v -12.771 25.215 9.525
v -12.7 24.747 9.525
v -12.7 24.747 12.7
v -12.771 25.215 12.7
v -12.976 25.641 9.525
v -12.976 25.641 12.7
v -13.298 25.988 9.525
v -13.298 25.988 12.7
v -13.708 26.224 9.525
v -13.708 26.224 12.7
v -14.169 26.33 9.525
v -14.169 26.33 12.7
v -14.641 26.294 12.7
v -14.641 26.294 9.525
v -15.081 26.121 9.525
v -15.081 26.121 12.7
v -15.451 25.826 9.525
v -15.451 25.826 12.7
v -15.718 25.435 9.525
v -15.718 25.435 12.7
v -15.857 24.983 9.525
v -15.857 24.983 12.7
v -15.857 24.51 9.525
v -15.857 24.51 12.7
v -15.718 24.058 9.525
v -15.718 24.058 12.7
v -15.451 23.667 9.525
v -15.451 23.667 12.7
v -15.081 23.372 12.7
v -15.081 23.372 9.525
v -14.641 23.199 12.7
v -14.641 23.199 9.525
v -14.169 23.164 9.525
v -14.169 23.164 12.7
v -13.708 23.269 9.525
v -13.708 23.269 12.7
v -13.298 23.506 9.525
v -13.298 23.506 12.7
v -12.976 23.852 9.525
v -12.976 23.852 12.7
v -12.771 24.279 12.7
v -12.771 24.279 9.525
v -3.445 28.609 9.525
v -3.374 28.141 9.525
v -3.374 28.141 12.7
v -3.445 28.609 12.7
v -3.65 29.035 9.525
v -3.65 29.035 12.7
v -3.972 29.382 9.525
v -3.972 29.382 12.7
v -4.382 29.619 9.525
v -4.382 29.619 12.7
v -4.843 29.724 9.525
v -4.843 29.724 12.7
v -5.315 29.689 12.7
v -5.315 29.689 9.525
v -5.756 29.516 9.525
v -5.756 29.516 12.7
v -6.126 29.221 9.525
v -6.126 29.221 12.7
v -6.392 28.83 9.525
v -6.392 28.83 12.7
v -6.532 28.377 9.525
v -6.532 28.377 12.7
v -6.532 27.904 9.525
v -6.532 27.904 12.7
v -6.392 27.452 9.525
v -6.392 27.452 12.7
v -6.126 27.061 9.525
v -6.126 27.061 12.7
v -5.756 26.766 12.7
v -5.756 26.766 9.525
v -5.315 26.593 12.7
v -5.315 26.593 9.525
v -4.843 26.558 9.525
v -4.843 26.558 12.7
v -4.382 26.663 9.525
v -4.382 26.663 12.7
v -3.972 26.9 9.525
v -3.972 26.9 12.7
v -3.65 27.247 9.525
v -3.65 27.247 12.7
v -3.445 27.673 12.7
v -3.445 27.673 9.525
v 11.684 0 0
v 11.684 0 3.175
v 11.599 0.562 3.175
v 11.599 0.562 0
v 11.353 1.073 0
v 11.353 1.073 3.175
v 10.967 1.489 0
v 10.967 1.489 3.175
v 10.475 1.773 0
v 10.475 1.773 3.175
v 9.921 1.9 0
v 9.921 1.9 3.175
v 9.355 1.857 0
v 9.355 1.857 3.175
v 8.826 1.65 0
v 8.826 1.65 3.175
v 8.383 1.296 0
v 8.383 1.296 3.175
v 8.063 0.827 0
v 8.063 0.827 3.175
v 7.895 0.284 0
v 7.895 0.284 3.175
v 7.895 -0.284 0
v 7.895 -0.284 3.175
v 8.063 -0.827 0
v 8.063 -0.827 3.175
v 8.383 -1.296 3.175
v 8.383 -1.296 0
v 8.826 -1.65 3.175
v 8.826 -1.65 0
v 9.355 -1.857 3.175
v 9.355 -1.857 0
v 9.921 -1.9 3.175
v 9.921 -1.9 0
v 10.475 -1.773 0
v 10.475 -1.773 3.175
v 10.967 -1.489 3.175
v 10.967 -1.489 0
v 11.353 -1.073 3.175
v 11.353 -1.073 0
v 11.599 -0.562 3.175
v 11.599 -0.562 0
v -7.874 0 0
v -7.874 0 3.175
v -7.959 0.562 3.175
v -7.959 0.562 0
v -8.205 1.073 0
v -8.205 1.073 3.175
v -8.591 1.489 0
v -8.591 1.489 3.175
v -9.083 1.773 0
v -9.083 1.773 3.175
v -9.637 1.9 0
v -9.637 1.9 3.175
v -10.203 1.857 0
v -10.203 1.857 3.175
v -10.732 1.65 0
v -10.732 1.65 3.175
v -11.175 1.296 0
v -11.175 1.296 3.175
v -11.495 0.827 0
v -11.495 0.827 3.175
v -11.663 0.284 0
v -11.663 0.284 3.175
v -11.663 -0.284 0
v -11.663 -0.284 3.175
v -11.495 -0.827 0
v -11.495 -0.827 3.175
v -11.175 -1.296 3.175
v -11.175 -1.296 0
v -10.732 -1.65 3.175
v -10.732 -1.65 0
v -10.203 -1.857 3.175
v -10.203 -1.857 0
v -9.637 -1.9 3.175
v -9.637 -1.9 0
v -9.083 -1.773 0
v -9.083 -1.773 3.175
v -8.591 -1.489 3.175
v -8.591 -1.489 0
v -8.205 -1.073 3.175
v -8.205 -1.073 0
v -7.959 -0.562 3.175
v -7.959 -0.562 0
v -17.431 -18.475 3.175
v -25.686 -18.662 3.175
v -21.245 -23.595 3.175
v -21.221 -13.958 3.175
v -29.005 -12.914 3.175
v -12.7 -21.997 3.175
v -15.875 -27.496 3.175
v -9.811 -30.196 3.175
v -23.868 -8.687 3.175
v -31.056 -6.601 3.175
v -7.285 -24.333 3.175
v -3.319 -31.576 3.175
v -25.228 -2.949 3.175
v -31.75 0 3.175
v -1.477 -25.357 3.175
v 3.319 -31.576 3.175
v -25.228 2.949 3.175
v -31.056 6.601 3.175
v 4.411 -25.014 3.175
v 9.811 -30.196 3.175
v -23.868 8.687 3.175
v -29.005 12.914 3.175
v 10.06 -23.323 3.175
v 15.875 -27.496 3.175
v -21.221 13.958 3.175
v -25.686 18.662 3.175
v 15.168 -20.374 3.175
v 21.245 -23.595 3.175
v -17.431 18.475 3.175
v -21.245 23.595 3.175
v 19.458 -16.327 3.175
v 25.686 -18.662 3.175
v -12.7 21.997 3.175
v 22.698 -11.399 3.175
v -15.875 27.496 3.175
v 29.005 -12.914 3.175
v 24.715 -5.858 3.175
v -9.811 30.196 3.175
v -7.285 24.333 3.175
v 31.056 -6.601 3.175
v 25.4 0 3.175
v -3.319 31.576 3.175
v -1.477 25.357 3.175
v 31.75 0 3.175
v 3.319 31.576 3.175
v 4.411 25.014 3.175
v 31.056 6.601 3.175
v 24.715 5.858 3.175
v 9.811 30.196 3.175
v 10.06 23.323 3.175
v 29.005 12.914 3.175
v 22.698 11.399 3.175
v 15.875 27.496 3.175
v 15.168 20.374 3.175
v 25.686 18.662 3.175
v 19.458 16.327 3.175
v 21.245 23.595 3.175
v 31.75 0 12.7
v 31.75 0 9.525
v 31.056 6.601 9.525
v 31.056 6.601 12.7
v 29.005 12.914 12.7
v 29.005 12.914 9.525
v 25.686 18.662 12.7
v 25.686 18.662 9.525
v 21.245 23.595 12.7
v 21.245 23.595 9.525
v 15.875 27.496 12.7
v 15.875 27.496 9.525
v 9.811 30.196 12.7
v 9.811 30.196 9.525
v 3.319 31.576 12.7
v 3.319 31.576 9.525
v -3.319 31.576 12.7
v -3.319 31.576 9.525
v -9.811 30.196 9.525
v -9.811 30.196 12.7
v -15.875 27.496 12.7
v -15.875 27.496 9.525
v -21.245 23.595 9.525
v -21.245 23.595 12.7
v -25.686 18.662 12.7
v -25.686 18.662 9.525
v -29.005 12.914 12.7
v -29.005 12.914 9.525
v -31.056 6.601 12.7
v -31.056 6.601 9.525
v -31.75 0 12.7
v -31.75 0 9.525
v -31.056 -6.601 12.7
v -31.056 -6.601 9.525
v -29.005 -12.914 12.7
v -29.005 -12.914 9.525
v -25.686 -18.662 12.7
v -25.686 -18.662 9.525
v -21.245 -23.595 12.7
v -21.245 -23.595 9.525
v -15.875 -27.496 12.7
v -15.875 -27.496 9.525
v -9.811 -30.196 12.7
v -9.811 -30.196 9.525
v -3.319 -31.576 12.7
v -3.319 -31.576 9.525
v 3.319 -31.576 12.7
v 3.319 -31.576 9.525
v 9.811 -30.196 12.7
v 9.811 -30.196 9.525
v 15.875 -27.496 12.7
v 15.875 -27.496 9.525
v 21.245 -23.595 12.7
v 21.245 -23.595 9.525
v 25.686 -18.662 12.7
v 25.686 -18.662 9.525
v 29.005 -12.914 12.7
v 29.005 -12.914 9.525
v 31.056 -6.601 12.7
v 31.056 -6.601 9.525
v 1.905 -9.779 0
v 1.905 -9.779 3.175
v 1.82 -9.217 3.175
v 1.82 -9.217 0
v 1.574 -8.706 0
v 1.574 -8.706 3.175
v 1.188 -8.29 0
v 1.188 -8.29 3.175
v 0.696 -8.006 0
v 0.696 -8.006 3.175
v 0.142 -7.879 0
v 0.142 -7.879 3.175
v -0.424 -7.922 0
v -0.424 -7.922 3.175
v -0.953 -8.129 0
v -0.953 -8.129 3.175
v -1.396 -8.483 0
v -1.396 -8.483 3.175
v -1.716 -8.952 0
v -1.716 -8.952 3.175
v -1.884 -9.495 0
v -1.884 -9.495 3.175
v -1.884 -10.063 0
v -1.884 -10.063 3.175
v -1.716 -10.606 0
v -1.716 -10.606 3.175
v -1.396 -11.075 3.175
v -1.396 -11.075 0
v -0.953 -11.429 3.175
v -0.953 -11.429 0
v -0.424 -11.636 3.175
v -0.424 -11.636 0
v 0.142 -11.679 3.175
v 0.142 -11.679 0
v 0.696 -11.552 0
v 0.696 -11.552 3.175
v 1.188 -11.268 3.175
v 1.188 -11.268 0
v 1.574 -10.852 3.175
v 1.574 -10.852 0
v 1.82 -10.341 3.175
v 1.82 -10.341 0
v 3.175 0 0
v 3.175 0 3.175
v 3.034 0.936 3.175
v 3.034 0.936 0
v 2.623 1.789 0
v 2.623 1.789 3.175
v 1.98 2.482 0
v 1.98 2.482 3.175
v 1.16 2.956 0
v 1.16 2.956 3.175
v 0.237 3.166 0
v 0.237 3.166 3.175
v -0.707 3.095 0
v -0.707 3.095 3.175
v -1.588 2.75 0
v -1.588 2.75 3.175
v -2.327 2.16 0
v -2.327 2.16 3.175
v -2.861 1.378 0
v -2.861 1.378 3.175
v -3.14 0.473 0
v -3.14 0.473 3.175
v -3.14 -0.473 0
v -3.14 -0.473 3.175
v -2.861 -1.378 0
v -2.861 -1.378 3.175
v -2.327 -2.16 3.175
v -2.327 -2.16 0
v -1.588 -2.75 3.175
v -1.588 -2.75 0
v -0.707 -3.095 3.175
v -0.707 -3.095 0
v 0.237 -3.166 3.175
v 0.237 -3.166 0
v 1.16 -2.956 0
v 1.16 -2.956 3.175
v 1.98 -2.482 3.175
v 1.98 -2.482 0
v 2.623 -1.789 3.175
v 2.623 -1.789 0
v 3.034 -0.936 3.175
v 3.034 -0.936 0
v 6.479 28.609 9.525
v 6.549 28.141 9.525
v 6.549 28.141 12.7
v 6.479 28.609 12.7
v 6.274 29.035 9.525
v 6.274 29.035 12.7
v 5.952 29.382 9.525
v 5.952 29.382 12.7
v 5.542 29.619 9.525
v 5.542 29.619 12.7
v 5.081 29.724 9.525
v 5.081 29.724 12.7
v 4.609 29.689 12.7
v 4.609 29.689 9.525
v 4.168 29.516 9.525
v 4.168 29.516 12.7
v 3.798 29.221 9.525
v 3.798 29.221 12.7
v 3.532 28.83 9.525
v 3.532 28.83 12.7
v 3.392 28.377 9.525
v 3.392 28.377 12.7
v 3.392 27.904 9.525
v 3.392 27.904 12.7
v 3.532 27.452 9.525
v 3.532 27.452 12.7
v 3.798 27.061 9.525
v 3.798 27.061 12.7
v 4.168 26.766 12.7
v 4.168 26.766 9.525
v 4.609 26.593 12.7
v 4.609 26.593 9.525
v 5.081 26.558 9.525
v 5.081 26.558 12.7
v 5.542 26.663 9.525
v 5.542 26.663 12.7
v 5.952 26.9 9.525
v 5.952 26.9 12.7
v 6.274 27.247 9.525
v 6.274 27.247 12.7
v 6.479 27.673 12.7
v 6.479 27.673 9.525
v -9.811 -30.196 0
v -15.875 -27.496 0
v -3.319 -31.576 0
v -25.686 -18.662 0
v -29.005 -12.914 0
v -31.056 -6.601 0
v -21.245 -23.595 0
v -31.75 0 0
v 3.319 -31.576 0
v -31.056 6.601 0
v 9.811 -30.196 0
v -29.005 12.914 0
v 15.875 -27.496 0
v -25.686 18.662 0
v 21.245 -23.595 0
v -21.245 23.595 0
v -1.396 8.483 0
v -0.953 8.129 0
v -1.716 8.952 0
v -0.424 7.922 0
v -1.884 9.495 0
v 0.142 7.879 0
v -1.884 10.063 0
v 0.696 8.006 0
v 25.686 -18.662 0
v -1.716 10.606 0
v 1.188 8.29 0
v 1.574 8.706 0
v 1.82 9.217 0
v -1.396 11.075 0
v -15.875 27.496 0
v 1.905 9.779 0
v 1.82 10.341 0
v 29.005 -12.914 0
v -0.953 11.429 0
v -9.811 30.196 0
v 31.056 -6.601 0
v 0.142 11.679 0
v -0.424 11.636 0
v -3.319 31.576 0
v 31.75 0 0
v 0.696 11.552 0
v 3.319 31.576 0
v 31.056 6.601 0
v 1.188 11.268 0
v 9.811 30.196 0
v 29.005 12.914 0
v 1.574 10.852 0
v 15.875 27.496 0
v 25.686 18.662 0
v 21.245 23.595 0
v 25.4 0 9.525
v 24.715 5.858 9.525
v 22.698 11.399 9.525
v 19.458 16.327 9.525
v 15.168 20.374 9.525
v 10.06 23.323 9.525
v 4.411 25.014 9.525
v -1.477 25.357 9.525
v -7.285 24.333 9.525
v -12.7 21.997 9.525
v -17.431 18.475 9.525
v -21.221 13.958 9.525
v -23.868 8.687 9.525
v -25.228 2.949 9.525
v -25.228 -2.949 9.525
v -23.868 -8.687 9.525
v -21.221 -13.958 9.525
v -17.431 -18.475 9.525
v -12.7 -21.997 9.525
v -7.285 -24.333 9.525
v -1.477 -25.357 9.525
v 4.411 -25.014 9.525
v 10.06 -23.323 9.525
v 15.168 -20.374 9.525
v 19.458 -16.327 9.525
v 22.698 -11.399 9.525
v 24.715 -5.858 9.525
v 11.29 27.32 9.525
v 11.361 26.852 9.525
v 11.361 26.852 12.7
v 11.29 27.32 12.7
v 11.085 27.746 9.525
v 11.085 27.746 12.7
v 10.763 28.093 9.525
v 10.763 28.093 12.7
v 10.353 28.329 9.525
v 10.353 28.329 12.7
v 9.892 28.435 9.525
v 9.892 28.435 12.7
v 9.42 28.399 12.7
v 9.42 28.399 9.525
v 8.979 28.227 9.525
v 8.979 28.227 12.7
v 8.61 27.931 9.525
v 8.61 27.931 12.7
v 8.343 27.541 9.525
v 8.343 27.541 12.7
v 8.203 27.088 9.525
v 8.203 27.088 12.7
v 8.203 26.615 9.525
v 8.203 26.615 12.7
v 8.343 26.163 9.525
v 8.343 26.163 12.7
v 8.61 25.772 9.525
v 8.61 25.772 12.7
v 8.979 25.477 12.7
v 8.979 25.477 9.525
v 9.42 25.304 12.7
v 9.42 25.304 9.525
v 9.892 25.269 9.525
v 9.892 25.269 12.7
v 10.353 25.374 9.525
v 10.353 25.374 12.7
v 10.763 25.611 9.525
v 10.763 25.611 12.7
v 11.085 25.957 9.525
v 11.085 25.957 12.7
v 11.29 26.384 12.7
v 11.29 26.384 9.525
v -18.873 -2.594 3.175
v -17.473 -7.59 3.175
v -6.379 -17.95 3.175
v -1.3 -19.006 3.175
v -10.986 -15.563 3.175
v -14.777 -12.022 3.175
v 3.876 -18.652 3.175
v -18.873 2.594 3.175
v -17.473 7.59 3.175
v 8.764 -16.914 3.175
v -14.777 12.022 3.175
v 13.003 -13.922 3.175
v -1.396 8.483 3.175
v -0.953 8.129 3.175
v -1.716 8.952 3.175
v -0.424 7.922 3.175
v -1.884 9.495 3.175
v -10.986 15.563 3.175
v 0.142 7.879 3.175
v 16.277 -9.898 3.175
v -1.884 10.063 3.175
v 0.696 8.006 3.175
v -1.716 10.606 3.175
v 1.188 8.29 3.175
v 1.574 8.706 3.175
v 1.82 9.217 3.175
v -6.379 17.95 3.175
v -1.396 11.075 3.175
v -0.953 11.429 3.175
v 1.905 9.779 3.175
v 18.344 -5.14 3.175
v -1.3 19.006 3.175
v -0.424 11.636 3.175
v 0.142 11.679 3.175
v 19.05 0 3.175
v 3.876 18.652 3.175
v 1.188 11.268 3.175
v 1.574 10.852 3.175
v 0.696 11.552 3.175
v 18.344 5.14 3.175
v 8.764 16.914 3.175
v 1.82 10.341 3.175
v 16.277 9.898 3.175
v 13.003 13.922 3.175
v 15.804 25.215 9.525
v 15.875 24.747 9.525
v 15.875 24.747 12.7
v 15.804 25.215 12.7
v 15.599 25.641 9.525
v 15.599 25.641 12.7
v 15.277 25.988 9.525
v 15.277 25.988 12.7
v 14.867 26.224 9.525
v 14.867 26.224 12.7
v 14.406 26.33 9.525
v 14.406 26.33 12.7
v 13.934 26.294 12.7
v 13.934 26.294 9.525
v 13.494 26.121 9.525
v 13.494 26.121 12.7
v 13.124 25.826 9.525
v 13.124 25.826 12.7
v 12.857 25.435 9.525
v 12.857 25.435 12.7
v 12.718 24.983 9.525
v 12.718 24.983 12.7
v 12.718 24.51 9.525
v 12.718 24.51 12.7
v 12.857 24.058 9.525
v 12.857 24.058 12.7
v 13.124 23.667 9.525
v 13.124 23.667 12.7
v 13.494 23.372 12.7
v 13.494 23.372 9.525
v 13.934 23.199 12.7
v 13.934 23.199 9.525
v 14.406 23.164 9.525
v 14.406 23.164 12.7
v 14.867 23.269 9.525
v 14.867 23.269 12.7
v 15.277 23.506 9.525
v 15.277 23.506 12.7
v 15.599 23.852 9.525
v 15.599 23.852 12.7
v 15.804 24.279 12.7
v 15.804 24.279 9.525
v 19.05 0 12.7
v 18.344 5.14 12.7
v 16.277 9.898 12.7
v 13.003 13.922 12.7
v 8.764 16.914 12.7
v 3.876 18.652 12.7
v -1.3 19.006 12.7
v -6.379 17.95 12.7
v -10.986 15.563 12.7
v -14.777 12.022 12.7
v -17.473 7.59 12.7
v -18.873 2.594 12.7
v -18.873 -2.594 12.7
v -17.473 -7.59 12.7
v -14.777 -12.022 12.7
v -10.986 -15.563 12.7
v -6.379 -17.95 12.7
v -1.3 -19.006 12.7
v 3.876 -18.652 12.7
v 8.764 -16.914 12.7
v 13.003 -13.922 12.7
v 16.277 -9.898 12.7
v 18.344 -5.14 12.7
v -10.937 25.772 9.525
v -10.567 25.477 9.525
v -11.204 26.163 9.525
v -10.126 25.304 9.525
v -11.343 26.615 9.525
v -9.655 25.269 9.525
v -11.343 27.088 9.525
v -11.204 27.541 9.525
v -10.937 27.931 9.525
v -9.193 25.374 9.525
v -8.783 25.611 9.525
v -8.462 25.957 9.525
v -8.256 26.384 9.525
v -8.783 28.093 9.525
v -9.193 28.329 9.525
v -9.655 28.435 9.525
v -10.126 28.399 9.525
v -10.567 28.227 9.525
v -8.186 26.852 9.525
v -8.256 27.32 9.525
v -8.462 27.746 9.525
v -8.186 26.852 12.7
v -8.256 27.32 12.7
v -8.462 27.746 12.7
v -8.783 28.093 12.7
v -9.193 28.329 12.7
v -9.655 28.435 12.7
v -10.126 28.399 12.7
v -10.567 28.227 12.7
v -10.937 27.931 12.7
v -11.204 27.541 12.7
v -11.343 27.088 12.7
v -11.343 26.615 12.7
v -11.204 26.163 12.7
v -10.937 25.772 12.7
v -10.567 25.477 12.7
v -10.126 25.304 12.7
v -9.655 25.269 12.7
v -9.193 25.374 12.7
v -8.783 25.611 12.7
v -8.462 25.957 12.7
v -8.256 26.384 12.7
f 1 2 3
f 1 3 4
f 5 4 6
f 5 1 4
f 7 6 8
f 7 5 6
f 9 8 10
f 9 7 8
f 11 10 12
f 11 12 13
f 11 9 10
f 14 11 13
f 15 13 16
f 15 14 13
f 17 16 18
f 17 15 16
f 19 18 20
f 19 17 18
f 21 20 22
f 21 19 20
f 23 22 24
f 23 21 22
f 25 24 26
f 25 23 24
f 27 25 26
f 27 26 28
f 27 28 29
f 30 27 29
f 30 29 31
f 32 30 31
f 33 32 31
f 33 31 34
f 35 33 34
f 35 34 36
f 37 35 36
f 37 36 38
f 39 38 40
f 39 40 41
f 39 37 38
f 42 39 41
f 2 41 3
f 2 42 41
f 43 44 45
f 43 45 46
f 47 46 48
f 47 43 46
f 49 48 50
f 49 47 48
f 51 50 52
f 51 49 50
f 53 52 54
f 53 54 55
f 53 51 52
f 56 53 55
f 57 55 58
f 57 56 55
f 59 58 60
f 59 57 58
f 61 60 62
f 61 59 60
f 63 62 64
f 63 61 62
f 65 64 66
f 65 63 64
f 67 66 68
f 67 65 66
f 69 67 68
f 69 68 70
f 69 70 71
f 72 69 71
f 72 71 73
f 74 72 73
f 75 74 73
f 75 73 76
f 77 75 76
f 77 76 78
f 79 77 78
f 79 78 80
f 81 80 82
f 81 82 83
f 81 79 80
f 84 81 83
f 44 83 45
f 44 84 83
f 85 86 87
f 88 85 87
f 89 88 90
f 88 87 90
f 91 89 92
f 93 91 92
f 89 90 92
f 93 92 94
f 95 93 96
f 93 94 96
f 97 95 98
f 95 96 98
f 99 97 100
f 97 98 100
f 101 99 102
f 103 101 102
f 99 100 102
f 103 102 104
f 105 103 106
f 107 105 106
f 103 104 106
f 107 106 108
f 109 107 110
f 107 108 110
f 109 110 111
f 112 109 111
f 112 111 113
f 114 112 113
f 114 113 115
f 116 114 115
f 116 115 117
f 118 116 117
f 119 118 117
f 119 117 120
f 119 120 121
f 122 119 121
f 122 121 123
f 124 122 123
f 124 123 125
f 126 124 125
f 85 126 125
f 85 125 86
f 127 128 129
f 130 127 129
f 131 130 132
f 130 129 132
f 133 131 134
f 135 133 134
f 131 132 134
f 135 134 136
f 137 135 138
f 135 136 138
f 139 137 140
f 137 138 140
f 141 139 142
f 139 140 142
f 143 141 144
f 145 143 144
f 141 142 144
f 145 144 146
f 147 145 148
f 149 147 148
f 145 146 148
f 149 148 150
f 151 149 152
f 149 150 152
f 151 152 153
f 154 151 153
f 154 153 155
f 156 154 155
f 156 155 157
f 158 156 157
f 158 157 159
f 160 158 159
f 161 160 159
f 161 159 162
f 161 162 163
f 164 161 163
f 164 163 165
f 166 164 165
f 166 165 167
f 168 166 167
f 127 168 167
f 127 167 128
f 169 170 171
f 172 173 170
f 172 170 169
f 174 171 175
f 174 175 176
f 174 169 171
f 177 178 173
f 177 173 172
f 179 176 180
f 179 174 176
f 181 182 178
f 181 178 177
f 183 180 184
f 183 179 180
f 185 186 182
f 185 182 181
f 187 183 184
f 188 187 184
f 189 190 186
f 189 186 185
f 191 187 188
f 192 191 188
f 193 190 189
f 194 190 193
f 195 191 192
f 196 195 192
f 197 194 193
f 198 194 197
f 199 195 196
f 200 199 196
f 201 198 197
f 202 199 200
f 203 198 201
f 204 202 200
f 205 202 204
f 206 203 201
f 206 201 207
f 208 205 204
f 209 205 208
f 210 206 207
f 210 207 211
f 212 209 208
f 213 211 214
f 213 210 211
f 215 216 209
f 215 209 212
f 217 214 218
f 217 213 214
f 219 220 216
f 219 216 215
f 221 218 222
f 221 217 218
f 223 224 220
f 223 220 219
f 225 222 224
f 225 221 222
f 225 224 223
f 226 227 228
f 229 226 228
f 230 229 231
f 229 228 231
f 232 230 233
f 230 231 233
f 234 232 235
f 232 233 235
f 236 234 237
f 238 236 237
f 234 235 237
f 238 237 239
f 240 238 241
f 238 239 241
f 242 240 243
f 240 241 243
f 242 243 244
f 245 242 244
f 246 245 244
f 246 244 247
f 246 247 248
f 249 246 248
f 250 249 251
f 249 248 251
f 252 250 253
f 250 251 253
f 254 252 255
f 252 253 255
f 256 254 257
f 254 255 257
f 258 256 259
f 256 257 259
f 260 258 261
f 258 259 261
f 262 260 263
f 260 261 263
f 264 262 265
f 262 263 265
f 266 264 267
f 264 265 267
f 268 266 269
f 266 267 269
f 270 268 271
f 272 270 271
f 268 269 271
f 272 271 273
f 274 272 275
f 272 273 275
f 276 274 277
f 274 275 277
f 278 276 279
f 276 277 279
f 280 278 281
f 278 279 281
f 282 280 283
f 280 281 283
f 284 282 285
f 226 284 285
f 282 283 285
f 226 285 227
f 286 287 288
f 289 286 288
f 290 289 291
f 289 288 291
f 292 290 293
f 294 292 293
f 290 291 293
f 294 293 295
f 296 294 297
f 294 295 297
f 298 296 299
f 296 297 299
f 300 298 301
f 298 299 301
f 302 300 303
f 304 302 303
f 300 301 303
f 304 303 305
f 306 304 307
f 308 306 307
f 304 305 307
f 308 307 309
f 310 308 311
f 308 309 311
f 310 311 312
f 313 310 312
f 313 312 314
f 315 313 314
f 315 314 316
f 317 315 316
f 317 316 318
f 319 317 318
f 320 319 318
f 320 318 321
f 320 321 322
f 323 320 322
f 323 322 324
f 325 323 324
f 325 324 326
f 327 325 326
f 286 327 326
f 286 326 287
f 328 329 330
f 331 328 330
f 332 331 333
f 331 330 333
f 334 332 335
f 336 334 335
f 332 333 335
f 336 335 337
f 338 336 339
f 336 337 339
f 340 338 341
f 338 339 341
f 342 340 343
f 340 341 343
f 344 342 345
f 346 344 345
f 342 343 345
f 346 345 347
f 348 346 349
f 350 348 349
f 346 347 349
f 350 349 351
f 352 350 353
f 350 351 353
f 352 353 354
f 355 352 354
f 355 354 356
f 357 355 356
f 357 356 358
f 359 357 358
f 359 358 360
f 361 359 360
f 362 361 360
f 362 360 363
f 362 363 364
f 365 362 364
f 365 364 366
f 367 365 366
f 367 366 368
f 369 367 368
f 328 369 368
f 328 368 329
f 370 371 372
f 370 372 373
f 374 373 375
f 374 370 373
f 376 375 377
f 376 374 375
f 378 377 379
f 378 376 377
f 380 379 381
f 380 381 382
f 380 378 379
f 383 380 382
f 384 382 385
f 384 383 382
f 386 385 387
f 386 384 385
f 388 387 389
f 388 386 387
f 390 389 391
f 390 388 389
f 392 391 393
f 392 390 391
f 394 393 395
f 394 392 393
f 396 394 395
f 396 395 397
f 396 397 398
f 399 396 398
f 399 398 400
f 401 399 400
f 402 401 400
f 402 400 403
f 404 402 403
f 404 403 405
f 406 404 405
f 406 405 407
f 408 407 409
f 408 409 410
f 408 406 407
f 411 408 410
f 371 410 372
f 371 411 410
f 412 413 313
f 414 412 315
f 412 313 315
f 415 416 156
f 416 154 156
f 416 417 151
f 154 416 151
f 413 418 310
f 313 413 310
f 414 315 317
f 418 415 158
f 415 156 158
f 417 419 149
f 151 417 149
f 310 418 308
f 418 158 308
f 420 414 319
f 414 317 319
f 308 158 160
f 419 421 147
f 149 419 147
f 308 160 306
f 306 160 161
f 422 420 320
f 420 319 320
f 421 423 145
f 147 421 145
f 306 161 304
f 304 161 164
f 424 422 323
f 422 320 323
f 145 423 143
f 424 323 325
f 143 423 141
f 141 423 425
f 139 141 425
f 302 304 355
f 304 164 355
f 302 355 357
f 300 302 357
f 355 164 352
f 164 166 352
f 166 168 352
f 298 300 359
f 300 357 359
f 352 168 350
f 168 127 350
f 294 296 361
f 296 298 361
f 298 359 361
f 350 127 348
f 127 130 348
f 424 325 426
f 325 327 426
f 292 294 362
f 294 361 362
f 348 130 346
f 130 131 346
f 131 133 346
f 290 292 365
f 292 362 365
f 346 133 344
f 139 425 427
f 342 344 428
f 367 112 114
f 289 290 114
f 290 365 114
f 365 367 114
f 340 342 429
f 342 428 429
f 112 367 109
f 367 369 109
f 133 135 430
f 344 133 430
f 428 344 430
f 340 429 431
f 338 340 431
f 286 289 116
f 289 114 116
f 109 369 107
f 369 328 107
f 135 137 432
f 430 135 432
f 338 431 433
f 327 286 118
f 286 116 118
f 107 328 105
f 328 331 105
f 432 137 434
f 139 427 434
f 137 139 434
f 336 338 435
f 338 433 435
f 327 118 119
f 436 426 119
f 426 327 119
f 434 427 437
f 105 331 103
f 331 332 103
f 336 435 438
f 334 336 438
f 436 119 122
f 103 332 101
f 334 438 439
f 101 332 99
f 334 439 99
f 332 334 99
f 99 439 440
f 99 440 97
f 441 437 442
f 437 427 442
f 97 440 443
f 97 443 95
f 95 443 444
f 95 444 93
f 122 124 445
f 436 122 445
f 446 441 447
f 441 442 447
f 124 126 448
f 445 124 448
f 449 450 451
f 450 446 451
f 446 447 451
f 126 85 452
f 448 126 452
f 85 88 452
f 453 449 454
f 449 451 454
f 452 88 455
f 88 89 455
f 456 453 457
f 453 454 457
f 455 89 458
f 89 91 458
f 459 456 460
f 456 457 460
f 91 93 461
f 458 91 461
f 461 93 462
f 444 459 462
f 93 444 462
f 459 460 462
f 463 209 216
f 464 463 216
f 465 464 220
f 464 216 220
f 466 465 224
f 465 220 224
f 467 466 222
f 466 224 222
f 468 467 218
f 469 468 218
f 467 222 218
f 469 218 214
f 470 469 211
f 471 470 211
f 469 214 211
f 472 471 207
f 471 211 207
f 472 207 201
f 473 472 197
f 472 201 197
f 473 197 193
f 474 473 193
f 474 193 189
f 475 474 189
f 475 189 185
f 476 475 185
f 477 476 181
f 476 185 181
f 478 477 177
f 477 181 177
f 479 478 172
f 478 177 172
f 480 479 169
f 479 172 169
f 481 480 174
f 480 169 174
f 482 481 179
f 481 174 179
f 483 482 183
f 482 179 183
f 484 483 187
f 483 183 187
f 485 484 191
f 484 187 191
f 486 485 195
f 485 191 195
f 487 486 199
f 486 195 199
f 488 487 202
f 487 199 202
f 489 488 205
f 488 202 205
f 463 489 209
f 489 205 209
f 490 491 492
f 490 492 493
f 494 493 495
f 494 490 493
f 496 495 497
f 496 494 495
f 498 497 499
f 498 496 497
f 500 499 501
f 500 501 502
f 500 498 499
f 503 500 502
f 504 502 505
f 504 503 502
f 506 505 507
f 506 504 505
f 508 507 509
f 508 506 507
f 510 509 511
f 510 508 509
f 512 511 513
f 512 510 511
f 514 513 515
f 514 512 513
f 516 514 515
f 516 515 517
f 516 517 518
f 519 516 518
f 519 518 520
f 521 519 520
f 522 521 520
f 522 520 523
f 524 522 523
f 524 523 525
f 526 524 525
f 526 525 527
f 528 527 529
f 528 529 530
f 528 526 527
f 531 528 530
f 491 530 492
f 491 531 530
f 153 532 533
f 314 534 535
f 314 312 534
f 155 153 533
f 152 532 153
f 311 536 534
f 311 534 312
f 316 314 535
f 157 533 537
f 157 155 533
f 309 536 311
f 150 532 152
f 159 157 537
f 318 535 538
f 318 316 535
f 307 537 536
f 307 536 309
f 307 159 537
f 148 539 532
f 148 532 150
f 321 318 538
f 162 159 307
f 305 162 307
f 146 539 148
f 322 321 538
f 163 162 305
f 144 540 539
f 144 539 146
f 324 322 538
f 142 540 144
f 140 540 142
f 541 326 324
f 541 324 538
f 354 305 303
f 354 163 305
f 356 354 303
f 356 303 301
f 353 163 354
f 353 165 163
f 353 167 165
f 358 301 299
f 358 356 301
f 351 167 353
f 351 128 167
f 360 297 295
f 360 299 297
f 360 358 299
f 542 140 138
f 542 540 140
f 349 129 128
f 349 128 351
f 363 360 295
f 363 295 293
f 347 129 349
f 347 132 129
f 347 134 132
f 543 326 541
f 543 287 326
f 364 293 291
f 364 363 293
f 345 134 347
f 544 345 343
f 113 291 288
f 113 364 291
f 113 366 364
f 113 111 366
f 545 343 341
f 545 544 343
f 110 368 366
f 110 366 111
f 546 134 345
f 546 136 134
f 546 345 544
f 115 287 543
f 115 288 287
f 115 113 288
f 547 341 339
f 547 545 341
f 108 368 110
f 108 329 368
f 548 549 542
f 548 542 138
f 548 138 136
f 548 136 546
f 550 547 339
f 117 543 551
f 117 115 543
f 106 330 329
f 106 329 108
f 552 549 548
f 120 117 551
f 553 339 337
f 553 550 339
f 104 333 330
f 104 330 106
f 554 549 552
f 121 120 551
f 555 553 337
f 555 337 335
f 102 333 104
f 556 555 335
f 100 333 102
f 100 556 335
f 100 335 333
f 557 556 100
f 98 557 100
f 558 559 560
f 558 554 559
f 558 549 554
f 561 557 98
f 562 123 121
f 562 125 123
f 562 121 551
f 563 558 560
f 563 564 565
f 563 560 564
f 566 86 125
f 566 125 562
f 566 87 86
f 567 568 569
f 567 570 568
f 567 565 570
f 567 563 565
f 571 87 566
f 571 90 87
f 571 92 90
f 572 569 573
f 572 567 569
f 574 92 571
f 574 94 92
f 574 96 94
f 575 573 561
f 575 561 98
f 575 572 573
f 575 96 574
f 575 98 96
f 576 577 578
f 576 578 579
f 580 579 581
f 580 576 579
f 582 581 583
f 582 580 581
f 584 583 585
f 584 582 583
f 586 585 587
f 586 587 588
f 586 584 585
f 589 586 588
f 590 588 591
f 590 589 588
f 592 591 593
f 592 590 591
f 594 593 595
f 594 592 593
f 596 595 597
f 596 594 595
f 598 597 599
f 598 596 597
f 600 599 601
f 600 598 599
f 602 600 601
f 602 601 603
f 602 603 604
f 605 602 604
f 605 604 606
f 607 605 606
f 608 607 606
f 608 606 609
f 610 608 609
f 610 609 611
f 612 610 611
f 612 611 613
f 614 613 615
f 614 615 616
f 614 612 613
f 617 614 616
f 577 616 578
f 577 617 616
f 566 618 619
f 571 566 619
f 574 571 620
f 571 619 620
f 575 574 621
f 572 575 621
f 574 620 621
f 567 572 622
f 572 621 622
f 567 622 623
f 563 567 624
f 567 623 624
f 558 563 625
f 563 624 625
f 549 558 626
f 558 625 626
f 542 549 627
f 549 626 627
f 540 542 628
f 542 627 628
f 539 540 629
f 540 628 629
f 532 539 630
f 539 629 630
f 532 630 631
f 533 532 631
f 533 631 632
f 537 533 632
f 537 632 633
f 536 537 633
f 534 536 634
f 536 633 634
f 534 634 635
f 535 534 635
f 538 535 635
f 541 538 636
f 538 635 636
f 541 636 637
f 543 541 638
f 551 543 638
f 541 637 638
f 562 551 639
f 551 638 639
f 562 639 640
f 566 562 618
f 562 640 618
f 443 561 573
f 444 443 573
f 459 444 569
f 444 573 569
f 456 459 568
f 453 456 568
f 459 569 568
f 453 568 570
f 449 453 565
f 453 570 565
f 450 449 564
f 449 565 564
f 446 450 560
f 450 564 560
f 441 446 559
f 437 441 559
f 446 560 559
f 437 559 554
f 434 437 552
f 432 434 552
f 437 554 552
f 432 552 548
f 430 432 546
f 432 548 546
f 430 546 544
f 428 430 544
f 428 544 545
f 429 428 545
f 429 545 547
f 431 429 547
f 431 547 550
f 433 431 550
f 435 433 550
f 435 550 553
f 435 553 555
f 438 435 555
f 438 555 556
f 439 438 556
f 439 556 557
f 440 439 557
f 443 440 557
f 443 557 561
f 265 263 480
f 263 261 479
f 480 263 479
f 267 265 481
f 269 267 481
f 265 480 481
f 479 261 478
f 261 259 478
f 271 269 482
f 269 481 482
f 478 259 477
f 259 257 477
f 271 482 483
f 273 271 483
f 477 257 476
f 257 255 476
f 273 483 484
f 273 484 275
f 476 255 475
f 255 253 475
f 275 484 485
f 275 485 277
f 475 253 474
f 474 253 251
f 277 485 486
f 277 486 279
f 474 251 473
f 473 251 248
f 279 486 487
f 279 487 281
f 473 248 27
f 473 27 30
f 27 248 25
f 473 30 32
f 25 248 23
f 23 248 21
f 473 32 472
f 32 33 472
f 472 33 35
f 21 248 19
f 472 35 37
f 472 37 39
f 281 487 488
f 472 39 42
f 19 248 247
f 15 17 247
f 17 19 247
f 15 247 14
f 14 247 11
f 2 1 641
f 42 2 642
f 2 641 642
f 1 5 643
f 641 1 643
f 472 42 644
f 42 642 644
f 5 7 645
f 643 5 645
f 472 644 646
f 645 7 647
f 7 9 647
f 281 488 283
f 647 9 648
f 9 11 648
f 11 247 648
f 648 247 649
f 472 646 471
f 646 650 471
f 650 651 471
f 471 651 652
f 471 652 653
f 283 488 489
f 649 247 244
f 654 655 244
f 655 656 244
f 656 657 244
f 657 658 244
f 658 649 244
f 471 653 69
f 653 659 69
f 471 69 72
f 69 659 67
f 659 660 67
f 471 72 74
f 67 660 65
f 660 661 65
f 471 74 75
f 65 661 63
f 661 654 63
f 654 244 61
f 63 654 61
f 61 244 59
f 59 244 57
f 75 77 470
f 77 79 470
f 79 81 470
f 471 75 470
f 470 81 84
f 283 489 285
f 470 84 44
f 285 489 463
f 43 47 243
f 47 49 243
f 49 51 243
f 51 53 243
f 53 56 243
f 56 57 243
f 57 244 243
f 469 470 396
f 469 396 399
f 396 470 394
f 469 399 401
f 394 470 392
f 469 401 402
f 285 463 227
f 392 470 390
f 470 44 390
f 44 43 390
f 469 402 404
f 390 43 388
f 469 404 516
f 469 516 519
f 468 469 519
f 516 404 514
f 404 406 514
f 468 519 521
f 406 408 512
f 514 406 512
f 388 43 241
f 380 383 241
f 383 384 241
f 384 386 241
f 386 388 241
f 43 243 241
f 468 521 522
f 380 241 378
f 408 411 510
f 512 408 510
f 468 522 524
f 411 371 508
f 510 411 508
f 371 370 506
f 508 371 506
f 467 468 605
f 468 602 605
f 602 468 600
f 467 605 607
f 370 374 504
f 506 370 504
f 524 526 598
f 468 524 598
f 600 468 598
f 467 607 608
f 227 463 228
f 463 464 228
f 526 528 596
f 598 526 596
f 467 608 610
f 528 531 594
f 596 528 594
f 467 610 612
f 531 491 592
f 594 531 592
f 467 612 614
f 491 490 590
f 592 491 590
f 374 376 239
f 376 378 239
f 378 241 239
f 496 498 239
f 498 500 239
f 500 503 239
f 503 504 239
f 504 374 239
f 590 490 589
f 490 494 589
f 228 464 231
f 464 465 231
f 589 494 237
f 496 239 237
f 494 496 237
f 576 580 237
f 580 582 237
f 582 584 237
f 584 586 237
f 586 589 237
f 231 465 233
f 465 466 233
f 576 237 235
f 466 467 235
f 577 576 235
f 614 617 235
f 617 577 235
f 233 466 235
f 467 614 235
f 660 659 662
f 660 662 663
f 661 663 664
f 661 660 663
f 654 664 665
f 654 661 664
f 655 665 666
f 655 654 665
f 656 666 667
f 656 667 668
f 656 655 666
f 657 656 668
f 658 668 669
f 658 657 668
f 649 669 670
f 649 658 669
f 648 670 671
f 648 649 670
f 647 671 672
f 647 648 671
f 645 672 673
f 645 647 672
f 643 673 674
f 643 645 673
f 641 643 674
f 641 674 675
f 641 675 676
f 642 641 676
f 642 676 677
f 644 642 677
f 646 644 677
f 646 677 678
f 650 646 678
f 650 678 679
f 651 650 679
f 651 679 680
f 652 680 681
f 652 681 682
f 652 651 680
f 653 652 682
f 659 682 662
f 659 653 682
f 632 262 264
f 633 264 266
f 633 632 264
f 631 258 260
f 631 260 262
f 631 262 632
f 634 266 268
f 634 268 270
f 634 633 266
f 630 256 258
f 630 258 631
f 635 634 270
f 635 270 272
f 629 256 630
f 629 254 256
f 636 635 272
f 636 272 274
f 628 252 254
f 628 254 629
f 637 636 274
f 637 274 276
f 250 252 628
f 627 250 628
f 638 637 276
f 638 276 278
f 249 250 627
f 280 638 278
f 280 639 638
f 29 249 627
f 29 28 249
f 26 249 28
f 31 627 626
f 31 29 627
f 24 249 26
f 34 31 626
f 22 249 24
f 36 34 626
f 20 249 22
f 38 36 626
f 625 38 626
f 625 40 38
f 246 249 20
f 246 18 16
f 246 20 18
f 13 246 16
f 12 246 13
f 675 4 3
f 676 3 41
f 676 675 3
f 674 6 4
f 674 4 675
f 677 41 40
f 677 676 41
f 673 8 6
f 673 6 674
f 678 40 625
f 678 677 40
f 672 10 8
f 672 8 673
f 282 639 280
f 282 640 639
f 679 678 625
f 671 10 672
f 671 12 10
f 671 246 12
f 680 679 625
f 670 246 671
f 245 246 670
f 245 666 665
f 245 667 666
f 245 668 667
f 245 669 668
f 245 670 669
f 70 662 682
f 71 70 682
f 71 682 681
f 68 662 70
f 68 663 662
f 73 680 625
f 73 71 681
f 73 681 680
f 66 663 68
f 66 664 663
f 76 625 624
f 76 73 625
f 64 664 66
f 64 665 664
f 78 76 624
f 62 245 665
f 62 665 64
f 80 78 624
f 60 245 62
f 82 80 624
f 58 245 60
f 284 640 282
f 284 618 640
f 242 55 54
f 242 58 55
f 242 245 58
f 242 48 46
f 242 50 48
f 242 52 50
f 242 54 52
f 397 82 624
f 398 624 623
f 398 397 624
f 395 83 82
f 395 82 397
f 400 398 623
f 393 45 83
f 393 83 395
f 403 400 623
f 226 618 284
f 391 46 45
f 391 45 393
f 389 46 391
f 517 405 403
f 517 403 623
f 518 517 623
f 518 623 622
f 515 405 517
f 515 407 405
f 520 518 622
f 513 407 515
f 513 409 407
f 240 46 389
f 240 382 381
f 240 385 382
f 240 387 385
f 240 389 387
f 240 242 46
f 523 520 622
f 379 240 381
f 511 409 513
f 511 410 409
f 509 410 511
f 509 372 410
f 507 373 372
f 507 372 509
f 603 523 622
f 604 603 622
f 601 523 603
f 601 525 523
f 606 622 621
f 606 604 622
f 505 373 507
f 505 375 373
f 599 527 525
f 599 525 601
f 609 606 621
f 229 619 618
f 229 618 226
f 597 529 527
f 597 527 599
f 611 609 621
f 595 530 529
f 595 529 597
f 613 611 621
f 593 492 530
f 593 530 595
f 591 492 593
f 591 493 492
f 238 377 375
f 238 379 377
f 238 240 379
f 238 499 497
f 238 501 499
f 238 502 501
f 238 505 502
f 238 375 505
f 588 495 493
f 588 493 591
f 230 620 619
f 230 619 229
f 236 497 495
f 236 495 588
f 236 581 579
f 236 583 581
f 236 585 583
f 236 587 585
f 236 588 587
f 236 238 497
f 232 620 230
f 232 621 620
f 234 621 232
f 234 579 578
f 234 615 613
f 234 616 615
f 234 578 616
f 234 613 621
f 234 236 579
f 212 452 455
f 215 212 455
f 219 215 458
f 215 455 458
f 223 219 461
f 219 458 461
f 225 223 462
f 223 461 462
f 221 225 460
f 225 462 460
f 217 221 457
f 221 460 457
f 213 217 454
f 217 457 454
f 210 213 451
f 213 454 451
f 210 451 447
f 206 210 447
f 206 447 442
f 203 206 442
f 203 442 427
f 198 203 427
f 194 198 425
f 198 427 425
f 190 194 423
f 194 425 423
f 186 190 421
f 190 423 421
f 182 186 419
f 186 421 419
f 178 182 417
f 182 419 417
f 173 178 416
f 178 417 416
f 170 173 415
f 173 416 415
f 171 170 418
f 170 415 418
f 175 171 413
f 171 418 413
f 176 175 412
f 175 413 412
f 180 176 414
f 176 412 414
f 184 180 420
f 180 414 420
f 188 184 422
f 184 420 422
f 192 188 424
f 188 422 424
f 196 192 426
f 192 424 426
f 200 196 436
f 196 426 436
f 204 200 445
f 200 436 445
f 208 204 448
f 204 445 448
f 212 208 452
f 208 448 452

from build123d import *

# Parameters (mm, degrees)
F0_R     = 31.75
F0_R_2   = 25.4
F1_DEPTH = 3.175
F2_R     = 25.4
F3_DEPTH = 6.35
F4_R     = 31.75
F4_R_2   = 1.5875
F5_DEPTH = 3.175
F6_R     = 1.905
F6_R_2   = 3.175
F7_DEPTH = 12.7
F8_R     = 19.05
F9_DEPTH = 9.525


with BuildPart() as f1:
    # F0 (on Top) → F1 (new body)
    with BuildSketch(Plane.XY):
        Circle(F0_R)
        Circle(F0_R_2, mode=Mode.SUBTRACT)
        Circle(F0_R_2)
    extrude(amount=F1_DEPTH)

    # F2 (on face) → F3 (join)
    with BuildSketch(Plane.XY.offset(3.175)):
        Circle(F2_R)
    extrude(amount=F3_DEPTH)

    # F4 (on face) → F5 (join)
    with BuildSketch(Plane.XY.offset(9.525)):
        Circle(F4_R)
        with Locations((-14.2875, 24.746676)):
            Circle(F4_R_2, mode=Mode.SUBTRACT)
        with Locations((-9.773226, 26.851717)):
            Circle(F4_R_2, mode=Mode.SUBTRACT)
        with Locations((-4.961997, 28.140882)):
            Circle(F4_R_2, mode=Mode.SUBTRACT)
        with Locations((4.961997, 28.140882)):
            Circle(F4_R_2, mode=Mode.SUBTRACT)
        with Locations((9.773226, 26.851717)):
            Circle(F4_R_2, mode=Mode.SUBTRACT)
        with Locations((14.2875, 24.746676)):
            Circle(F4_R_2, mode=Mode.SUBTRACT)
    extrude(amount=F5_DEPTH)

    # F6 (on face) → F7 (cut, through all)
    with BuildSketch(Plane.XY.offset(12.7)):
        with Locations((0, 9.779)):
            Circle(F6_R)
        with Locations((0, -9.779)):
            Circle(F6_R)
        with Locations((-9.779, 0)):
            Circle(F6_R)
        with Locations((9.779, 0)):
            Circle(F6_R)
        Circle(F6_R_2)
    extrude(amount=-F7_DEPTH, mode=Mode.SUBTRACT)

    # F8 (on face) → F9 (cut)
    with BuildSketch(Plane.XY.offset(12.7)):
        Circle(F8_R)
    extrude(amount=-F9_DEPTH, mode=Mode.SUBTRACT)


solid = f1.part
